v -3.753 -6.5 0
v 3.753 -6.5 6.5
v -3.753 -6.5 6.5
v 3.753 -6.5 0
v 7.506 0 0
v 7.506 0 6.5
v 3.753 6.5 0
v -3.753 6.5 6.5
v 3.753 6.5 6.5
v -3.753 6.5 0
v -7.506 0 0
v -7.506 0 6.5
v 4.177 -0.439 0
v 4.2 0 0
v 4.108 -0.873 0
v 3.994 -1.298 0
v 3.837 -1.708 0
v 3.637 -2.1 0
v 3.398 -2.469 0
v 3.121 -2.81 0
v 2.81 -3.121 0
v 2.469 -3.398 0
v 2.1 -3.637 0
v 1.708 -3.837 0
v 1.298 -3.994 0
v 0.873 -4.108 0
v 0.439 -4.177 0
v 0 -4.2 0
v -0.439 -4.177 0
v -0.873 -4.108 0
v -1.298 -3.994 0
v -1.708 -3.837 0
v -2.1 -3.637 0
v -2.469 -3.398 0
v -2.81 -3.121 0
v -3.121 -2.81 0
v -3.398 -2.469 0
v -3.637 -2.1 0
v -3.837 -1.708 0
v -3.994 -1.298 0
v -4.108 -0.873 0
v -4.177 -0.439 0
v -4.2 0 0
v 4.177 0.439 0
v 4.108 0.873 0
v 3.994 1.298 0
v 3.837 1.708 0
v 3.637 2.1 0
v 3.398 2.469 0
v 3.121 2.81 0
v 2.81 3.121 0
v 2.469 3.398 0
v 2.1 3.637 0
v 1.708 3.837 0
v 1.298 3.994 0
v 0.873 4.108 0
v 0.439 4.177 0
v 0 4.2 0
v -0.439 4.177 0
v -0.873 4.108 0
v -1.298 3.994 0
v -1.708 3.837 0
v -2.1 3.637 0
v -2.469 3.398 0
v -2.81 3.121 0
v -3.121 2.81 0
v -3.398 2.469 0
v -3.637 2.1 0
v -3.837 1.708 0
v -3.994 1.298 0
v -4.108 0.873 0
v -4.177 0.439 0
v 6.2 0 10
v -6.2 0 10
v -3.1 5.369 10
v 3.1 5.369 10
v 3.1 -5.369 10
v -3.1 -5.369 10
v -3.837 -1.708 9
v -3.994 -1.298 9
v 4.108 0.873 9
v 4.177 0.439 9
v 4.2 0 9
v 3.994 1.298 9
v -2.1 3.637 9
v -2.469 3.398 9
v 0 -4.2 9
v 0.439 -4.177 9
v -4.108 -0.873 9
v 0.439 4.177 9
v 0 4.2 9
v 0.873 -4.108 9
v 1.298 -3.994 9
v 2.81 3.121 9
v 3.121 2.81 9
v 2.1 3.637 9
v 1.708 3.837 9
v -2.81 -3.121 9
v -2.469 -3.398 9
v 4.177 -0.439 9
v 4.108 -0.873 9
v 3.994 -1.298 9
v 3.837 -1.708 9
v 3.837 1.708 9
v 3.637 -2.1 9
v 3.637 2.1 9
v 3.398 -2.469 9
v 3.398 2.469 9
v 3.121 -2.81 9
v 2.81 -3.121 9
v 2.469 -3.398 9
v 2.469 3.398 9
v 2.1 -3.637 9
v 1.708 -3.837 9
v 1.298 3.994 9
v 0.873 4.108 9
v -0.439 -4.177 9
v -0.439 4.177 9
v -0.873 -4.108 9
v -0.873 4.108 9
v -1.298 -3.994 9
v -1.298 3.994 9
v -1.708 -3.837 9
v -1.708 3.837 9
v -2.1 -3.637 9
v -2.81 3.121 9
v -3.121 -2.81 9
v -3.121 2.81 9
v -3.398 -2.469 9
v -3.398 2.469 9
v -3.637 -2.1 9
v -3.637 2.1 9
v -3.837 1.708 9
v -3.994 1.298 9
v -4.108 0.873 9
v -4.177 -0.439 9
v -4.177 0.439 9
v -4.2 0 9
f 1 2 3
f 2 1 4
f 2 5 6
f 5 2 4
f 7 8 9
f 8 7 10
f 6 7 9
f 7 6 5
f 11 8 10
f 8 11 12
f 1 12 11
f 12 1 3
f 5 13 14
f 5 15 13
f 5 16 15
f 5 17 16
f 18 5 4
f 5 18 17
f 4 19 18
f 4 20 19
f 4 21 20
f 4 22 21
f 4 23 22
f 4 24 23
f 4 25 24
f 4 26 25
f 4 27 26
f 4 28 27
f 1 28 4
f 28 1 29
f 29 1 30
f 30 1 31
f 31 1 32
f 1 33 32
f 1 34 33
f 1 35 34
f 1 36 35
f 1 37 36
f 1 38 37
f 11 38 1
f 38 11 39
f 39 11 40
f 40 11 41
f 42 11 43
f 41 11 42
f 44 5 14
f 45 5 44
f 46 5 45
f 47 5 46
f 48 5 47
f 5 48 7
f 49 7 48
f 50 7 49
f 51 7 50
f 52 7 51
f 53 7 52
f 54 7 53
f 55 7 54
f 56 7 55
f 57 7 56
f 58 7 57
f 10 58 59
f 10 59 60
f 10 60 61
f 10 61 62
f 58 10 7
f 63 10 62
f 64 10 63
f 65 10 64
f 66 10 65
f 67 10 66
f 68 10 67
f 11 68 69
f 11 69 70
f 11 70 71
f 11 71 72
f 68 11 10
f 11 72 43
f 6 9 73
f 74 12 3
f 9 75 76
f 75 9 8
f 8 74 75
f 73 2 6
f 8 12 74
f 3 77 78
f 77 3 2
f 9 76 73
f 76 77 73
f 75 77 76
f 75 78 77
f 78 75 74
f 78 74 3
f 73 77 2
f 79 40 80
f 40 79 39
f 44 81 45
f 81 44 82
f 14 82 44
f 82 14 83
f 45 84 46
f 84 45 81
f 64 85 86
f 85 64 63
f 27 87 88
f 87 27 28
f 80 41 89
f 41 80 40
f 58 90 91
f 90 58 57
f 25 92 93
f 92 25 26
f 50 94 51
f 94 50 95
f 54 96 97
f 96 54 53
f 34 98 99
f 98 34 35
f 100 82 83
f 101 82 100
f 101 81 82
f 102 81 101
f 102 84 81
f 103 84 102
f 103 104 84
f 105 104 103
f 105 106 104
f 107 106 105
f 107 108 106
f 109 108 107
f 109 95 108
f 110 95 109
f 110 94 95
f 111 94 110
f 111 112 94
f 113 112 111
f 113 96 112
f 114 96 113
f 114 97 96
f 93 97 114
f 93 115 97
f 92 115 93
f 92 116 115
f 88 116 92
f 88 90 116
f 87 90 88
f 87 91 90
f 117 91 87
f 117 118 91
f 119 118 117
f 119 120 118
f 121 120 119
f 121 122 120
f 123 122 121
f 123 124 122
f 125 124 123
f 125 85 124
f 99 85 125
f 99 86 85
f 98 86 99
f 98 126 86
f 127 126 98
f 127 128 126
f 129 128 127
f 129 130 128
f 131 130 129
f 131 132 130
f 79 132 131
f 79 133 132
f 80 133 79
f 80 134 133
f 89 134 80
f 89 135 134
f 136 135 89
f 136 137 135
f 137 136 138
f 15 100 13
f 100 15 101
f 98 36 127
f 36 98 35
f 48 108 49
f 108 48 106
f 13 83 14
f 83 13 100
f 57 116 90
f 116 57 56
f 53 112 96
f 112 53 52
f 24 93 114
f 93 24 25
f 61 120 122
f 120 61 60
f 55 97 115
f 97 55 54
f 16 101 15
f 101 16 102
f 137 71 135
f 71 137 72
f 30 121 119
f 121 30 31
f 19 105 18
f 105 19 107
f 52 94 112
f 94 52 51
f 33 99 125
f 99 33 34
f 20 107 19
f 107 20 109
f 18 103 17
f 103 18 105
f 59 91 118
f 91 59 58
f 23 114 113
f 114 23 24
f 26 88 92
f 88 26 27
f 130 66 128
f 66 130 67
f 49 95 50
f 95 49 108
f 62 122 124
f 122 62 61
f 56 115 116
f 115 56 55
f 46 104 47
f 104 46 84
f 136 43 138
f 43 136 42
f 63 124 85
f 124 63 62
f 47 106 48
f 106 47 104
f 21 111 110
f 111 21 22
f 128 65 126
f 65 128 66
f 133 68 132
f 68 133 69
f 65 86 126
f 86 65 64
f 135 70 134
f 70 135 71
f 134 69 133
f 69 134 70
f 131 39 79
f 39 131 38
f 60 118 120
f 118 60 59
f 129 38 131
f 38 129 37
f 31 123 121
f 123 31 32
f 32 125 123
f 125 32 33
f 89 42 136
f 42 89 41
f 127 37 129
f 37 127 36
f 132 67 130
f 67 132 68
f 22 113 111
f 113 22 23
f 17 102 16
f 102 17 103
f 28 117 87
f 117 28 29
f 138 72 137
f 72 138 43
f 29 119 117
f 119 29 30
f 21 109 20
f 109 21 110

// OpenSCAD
// Blind cap nut.
$fn = 60;
eps = 0.02;
thread_d = 8.4;
flat = 13;
height = 10;
body_h = height*0.65;
difference() {
    union() {
        cylinder(d=flat/cos(30),h=body_h,$fn=6);
        translate([0,0,body_h]) cylinder(d1=flat/cos(30),d2=thread_d+4,h=height-body_h,$fn=6);
    }
    translate([0,0,-eps]) cylinder(d=thread_d,h=height-1+eps);
}
